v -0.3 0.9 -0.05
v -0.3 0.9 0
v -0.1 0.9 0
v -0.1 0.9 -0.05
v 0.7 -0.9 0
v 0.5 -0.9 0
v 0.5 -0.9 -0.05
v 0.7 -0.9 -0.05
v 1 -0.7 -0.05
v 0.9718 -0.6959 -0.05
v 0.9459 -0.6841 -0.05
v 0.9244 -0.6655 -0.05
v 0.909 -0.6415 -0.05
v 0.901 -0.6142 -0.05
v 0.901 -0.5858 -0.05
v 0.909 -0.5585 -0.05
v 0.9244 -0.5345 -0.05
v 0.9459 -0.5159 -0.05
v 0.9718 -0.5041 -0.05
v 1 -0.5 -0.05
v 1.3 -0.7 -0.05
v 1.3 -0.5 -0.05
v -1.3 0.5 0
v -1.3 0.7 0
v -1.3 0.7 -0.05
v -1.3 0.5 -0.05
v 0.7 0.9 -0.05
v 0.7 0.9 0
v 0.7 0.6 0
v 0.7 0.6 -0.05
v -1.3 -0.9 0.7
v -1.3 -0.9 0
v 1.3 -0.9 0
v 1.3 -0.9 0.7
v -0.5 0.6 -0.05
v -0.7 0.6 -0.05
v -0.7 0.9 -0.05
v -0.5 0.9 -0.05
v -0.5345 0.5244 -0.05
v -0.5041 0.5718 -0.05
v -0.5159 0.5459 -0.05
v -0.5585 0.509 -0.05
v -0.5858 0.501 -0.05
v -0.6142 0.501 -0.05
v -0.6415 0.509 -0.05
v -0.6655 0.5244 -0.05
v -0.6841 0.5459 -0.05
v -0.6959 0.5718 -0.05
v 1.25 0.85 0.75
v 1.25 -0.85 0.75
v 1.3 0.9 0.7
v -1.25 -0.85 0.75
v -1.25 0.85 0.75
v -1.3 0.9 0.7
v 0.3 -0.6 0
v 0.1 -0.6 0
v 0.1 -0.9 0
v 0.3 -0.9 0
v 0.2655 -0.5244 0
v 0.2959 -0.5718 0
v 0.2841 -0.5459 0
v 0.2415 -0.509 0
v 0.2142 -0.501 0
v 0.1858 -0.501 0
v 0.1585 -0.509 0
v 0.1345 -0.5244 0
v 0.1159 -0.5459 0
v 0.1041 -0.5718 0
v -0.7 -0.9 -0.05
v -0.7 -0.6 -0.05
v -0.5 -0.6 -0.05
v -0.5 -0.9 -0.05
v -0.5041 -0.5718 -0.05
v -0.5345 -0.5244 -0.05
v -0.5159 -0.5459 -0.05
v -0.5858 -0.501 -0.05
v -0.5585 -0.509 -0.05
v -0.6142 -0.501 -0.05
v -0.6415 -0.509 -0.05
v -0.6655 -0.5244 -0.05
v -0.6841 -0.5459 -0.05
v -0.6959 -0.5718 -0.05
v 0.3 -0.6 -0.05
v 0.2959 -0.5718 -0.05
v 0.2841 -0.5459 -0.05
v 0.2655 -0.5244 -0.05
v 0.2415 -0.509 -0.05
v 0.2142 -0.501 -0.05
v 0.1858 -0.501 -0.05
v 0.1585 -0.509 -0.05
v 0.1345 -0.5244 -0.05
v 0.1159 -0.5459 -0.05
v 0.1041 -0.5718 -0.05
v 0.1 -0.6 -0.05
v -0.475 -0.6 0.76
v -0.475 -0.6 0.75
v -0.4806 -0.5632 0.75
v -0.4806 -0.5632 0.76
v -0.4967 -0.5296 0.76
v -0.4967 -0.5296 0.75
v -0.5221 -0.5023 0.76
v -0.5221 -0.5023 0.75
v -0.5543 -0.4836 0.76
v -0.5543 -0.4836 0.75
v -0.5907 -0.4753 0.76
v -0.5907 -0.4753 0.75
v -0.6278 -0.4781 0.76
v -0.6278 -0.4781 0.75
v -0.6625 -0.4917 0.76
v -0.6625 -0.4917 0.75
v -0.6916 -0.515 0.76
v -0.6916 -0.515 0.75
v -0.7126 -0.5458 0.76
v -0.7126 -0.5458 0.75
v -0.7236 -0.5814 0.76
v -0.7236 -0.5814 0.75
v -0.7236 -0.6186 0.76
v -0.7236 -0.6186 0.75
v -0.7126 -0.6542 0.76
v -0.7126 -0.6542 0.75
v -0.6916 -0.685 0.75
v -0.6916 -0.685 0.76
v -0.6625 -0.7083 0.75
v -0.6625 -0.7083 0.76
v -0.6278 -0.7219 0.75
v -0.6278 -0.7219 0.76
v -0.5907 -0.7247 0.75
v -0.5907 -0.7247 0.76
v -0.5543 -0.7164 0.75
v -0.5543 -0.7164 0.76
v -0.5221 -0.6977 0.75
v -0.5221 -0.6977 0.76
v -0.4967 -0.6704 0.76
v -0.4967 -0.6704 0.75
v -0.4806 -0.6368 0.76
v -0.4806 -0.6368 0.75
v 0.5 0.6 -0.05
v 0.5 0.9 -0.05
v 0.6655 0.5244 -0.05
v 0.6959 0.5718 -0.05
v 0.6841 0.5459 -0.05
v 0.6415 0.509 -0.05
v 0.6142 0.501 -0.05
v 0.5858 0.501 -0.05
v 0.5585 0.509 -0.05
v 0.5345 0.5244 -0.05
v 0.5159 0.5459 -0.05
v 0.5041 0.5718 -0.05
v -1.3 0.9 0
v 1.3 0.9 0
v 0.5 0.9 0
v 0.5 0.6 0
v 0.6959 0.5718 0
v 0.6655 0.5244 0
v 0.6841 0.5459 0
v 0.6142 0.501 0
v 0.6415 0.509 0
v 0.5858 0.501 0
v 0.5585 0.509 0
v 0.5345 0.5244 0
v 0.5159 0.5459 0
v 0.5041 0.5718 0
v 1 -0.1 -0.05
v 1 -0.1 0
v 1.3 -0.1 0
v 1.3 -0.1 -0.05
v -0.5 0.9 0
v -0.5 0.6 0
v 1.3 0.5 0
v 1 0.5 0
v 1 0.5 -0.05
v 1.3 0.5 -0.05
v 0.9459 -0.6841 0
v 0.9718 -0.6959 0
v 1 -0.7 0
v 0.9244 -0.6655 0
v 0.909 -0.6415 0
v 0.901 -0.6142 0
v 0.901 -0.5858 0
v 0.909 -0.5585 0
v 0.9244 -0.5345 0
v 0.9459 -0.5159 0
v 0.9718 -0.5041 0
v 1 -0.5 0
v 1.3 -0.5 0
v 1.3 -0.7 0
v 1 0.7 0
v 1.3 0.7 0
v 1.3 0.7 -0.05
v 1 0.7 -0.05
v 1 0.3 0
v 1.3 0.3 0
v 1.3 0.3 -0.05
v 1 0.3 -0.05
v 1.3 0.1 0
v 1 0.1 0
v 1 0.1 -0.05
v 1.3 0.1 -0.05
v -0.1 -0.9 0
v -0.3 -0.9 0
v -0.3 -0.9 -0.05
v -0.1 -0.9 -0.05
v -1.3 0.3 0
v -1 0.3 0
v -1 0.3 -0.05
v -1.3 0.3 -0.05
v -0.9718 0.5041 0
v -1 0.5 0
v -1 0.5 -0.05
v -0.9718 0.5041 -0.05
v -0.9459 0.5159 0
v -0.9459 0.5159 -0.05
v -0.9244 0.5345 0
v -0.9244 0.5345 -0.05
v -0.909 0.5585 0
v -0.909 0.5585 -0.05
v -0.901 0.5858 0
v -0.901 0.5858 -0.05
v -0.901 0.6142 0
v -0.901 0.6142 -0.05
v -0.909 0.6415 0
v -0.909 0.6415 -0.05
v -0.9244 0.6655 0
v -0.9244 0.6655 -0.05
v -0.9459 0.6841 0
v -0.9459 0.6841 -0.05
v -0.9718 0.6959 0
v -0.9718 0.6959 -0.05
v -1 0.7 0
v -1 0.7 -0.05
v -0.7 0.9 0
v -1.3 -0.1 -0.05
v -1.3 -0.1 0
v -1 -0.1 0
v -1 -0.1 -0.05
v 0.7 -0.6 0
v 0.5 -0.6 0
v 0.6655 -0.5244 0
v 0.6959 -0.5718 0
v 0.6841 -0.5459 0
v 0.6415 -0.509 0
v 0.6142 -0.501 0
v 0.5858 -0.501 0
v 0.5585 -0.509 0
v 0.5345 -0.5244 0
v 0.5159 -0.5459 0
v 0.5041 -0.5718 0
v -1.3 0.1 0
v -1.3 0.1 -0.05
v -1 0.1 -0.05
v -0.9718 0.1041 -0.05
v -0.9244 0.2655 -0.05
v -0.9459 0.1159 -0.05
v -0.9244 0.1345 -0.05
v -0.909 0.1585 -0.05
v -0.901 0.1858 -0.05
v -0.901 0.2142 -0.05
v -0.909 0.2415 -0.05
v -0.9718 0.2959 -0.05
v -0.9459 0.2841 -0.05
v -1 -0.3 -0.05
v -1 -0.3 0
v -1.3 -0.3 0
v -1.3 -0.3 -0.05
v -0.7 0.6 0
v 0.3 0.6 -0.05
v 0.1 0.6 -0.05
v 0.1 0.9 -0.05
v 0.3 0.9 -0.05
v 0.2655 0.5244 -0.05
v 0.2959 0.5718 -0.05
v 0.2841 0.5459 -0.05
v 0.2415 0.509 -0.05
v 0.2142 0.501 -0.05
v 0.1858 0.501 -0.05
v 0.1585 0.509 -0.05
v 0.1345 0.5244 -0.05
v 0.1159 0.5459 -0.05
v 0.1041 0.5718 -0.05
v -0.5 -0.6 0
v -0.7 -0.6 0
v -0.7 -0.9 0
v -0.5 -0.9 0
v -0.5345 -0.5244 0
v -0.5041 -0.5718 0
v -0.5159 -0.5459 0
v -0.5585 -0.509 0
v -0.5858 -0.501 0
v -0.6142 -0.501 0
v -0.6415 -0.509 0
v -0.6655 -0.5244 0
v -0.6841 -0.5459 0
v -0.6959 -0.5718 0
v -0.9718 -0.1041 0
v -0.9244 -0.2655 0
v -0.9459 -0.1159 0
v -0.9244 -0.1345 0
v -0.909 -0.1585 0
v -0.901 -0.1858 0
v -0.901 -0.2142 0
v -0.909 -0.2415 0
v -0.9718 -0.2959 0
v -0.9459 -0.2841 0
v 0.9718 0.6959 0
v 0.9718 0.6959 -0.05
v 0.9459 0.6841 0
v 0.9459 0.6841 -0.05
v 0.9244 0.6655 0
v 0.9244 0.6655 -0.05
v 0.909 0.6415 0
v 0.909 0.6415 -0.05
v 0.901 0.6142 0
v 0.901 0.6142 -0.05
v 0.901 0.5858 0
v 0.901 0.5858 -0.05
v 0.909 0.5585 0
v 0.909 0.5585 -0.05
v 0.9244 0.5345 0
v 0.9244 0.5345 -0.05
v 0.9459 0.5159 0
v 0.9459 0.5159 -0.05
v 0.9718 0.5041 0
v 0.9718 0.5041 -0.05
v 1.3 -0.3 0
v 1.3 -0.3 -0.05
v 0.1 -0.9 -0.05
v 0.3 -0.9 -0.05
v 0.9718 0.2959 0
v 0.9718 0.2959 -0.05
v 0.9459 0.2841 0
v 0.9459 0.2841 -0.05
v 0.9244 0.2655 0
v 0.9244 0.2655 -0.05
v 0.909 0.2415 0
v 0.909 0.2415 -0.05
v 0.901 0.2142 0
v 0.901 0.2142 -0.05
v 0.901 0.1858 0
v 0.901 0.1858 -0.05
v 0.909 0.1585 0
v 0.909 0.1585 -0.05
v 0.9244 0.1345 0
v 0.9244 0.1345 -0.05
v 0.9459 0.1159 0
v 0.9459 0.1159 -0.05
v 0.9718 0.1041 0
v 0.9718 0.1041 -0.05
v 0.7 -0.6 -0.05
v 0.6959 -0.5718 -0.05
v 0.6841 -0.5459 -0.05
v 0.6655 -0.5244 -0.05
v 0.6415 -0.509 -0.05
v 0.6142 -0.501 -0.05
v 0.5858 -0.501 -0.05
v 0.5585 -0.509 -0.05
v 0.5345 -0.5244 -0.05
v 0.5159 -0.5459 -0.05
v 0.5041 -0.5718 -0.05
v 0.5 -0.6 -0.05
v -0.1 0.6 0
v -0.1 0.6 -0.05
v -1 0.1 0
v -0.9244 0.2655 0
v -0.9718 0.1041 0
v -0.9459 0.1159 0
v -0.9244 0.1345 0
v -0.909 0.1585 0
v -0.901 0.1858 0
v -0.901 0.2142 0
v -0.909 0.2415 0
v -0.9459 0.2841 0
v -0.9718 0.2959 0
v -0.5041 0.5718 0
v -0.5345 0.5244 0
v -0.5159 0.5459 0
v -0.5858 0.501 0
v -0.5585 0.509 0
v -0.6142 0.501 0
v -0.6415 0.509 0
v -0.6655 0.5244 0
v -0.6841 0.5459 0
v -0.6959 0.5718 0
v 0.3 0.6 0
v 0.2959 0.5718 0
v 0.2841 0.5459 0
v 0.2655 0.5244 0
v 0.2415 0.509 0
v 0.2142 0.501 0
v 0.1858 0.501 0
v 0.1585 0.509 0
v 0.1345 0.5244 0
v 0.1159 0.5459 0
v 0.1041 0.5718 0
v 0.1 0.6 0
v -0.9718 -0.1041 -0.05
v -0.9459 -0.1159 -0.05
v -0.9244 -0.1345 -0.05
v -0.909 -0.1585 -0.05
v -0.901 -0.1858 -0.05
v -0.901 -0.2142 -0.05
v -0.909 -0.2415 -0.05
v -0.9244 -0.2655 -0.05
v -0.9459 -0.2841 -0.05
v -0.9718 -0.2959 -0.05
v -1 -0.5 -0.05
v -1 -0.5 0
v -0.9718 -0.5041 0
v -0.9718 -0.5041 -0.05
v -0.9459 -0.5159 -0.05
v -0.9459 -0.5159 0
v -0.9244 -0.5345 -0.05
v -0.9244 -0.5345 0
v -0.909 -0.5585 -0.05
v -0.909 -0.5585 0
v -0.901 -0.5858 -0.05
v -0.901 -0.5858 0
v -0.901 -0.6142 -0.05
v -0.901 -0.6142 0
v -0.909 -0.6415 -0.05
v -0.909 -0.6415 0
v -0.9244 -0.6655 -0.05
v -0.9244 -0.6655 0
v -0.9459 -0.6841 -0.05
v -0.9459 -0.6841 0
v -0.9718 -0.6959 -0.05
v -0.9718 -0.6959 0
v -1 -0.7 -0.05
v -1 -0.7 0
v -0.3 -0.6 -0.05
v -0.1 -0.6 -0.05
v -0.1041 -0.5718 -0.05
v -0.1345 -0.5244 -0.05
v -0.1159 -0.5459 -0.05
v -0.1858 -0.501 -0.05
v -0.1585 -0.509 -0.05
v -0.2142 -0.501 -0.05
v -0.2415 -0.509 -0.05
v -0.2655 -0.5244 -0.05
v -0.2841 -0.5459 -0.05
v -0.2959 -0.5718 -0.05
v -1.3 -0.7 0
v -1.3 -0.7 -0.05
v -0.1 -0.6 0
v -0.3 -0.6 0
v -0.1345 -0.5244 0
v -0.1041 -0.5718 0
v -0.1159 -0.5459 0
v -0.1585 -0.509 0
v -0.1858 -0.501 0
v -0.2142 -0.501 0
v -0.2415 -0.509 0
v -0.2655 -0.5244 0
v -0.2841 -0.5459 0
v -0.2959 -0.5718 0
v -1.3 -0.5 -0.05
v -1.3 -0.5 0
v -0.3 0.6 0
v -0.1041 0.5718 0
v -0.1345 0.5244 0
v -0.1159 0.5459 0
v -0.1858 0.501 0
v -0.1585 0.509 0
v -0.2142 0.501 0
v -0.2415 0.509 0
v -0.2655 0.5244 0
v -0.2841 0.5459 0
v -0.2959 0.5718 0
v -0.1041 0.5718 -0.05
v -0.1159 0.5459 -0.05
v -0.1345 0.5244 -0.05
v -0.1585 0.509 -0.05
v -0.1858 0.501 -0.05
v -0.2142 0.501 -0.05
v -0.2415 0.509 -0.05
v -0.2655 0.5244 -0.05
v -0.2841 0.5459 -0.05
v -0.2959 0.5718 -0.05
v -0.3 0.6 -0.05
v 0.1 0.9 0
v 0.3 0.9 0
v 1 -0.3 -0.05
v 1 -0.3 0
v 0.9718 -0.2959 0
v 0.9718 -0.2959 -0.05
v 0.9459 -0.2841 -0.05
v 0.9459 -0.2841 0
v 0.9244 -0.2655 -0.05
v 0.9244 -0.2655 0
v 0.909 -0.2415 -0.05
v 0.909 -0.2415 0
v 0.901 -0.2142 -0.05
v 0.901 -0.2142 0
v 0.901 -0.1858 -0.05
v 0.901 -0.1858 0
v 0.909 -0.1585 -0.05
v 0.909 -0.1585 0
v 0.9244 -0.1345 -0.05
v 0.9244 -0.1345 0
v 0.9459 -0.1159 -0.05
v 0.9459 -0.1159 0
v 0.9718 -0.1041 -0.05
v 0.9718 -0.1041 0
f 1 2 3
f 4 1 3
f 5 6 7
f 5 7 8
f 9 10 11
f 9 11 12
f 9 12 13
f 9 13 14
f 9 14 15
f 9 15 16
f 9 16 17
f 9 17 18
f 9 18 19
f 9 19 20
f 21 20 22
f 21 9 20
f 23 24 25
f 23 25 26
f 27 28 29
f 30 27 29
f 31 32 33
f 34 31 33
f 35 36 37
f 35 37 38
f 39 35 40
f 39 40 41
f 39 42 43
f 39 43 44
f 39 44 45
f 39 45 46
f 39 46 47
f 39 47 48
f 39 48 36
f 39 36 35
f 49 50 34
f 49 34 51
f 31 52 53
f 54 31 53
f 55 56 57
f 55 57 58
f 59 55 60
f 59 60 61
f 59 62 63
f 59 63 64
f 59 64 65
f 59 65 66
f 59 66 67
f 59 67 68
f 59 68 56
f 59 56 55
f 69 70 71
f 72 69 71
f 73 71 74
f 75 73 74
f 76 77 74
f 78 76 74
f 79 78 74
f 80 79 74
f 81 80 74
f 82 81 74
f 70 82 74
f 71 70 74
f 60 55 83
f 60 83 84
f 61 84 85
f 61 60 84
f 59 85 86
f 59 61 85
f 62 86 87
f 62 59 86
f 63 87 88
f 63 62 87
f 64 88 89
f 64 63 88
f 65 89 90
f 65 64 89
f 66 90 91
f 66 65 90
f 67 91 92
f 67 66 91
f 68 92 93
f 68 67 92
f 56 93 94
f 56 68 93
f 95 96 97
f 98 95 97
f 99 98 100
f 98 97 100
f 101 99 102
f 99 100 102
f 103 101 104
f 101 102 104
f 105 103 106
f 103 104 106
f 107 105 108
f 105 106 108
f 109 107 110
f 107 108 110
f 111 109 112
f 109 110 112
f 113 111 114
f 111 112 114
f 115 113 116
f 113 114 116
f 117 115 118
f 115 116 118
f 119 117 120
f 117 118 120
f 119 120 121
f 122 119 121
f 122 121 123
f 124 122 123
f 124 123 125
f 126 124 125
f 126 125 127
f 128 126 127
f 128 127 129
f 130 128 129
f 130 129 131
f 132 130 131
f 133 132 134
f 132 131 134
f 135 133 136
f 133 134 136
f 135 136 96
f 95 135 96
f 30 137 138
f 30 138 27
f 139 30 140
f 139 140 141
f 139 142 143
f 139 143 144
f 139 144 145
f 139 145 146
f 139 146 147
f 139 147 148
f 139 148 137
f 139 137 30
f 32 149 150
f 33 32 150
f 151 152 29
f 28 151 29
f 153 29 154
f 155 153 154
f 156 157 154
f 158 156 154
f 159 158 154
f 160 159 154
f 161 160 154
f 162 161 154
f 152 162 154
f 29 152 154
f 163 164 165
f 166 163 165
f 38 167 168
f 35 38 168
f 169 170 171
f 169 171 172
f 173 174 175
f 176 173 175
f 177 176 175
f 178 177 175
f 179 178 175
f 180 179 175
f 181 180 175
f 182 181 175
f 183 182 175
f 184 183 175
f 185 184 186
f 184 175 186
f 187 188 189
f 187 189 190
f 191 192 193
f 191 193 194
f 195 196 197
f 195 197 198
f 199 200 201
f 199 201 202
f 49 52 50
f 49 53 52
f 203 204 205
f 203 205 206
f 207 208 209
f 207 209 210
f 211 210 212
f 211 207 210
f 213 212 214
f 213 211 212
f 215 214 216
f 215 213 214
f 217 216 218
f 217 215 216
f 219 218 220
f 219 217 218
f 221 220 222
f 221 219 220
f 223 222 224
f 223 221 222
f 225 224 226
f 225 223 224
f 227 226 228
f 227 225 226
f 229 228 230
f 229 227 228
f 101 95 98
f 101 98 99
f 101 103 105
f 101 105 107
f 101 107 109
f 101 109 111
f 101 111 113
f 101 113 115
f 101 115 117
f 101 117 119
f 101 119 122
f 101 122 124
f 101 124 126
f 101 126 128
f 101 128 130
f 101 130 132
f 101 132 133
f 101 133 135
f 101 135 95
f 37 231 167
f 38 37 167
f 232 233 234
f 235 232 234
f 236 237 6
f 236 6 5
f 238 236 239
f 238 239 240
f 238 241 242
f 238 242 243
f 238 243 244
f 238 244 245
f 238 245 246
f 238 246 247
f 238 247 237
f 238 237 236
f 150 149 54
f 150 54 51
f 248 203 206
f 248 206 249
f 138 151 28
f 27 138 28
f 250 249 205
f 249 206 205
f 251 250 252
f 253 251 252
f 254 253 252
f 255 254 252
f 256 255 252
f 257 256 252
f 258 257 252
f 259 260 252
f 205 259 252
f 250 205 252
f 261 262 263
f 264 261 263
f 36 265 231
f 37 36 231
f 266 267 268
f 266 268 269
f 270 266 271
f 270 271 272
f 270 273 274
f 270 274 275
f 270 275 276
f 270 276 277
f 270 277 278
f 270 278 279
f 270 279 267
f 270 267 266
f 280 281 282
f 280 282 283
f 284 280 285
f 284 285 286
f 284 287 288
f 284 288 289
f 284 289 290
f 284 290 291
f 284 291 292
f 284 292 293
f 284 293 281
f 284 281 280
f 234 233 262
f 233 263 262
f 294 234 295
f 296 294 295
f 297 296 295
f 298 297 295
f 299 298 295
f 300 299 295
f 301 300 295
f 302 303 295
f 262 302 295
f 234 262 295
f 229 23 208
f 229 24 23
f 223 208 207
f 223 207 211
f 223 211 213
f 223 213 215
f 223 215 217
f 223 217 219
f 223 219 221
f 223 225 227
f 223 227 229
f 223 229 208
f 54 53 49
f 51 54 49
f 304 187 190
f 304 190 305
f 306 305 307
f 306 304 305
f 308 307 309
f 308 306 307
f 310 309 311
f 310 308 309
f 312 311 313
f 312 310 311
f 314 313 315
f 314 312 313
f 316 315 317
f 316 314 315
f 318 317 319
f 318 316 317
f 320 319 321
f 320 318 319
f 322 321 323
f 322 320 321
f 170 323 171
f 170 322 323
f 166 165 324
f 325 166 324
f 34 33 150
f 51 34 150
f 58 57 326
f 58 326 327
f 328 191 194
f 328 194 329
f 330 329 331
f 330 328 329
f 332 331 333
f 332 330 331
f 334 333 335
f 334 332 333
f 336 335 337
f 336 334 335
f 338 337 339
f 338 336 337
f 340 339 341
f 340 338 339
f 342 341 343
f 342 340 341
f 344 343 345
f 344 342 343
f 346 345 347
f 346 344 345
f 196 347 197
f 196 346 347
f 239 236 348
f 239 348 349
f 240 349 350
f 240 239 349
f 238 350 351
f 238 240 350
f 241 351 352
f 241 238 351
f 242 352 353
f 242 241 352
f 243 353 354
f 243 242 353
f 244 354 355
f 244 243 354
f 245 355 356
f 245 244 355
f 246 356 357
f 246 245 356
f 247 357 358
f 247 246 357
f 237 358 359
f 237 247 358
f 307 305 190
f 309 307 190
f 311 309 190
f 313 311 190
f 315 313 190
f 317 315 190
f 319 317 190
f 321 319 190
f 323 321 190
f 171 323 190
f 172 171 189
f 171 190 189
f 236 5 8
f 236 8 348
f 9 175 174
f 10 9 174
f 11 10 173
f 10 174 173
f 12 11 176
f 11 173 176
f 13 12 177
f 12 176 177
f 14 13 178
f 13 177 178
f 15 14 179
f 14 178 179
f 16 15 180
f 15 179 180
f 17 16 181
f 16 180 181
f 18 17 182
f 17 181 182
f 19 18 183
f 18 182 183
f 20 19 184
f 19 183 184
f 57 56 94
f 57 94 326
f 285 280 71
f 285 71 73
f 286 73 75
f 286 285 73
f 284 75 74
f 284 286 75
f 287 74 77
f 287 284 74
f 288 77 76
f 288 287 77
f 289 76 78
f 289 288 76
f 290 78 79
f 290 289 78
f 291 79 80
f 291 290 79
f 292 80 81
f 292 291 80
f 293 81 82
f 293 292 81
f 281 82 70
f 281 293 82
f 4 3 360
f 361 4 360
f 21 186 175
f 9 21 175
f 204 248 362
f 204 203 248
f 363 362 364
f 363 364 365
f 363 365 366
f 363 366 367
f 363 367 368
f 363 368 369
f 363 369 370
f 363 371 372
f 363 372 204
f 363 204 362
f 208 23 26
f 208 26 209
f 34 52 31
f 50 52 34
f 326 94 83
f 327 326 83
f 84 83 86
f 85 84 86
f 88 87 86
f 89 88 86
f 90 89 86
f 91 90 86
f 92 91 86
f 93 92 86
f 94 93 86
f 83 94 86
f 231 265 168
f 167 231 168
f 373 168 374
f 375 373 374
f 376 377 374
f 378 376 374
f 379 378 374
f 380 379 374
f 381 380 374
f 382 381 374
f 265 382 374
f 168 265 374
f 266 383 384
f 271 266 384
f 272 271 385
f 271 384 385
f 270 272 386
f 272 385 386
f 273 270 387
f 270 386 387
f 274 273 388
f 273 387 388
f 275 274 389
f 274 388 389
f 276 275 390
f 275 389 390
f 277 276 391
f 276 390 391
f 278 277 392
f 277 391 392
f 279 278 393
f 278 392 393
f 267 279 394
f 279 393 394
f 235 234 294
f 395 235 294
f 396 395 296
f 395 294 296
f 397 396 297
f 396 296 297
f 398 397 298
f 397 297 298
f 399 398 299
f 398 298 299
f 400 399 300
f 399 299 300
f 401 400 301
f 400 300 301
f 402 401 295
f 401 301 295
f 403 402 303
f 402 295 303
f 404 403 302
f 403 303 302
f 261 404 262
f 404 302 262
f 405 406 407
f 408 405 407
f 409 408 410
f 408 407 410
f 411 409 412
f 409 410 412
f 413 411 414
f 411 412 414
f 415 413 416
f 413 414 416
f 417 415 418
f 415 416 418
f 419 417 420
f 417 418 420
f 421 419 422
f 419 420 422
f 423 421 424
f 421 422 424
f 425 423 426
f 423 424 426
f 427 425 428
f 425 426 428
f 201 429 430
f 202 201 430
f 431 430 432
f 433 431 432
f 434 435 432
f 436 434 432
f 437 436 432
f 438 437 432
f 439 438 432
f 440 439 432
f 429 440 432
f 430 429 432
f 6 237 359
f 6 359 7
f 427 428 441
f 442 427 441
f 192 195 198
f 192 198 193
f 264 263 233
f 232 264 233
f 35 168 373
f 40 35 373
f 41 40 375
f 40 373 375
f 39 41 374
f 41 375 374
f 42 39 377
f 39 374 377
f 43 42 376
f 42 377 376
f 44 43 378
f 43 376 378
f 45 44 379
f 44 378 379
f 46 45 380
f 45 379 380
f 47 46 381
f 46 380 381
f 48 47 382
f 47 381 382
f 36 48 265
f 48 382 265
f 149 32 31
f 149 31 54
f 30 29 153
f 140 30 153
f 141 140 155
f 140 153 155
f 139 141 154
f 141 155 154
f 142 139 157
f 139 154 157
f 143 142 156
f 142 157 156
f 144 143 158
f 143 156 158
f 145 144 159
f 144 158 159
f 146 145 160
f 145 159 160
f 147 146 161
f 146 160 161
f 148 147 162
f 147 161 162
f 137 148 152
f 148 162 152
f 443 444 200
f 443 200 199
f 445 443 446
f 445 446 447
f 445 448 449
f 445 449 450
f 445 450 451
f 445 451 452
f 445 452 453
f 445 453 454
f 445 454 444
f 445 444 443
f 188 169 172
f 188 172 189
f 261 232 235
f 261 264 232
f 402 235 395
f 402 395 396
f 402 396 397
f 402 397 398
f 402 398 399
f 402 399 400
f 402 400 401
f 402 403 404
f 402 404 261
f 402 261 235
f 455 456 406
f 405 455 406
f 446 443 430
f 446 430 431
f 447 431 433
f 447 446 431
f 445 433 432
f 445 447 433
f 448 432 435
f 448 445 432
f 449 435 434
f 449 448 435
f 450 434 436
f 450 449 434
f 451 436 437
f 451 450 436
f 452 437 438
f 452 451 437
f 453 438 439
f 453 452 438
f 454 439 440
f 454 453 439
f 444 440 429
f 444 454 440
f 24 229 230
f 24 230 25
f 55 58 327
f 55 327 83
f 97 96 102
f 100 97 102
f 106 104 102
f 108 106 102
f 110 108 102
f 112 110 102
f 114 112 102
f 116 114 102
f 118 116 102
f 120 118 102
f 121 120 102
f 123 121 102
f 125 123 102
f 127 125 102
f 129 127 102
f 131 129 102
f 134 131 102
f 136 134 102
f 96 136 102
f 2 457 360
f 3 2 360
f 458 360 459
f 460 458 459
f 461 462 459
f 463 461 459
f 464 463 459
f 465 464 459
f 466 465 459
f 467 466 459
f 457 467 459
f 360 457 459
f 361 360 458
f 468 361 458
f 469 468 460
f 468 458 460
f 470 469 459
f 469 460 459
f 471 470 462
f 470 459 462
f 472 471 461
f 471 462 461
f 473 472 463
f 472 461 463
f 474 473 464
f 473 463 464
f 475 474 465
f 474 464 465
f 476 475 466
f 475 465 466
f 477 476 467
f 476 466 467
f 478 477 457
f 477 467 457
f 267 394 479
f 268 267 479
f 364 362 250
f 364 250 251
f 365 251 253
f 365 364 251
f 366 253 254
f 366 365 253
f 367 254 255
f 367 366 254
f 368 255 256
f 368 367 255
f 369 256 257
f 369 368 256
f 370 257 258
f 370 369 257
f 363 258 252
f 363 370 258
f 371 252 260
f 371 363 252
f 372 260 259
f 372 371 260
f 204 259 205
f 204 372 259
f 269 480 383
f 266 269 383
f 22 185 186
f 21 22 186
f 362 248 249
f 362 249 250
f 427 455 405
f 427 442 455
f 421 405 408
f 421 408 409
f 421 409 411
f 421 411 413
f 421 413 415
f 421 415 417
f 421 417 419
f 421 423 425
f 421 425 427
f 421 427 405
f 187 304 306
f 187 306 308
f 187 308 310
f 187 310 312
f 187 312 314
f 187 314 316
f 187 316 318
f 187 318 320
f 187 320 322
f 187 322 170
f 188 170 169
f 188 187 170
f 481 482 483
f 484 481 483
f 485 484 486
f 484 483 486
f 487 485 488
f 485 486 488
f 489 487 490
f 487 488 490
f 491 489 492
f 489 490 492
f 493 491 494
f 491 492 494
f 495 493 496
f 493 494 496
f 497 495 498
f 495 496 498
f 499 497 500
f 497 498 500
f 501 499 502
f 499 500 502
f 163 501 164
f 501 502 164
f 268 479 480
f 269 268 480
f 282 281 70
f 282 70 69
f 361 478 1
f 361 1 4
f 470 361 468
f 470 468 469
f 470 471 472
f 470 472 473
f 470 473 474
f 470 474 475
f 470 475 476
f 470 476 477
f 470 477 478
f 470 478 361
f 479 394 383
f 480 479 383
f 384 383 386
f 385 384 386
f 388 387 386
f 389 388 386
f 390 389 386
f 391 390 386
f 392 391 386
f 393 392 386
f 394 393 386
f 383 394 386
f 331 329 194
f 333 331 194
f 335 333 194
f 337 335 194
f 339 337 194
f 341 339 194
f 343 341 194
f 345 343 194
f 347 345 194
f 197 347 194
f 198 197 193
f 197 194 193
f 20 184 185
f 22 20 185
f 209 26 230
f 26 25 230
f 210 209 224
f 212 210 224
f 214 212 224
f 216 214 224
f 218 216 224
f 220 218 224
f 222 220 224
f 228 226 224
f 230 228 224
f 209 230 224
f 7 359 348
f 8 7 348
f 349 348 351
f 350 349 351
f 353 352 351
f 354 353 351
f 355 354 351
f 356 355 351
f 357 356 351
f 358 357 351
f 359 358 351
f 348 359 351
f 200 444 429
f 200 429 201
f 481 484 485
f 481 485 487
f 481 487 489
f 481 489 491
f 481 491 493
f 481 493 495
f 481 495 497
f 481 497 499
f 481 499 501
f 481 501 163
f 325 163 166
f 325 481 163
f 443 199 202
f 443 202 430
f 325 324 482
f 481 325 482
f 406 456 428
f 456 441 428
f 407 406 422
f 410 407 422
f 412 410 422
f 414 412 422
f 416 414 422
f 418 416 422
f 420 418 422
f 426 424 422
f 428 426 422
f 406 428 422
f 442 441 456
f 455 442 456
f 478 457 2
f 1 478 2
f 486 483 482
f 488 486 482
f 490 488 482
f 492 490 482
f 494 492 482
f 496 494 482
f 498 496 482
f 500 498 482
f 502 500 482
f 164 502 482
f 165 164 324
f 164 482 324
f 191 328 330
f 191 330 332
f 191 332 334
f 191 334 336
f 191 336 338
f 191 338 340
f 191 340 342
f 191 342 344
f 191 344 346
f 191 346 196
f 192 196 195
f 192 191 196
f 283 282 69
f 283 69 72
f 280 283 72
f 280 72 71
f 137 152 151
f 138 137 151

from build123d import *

# Parameters (mm, degrees)
F0_W     = 2.6
F0_H     = 1.8
F1_DEPTH = 0.75
F3_DEPTH = 0.05
F5_R     = 0.125
F6_DEPTH = 0.01
F7_SIZE  = 0.05


with BuildPart() as f1:
    # F0 (on Top) → F1 (new body)
    with BuildSketch(Plane.XY):
        Rectangle(F0_W, F0_H)
    extrude(amount=F1_DEPTH)

    # F7
    f7_edges = [f1.edges().sort_by_distance(p)[0] for p in [
        (0, -0.9, 0.75),
        (1.3, 0, 0.75),
        (0, 0.9, 0.75),
        (-1.3, 0, 0.75),
    ]]
    chamfer(f7_edges, length=F7_SIZE)


with BuildPart() as f3:
    # F2 (on Top) → F3 (new body)
    with BuildSketch(Plane.XY):
        with BuildLine():
            Line((-0.5, -0.9), (-0.5, -0.6))
            ThreePointArc((-0.5, -0.6), (-0.6, -0.5), (-0.7, -0.6))
            Line((-0.7, -0.6), (-0.7, -0.9))
            Line((-0.7, -0.9), (-0.5, -0.9))
        make_face()
        with BuildLine():
            Line((-0.1, -0.9), (-0.1, -0.6))
            ThreePointArc((-0.1, -0.6), (-0.2, -0.5), (-0.3, -0.6))
            Line((-0.3, -0.6), (-0.3, -0.9))
            Line((-0.3, -0.9), (-0.1, -0.9))
        make_face()
        with BuildLine():
            Line((0.3, -0.9), (0.3, -0.6))
            ThreePointArc((0.3, -0.6), (0.2, -0.5), (0.1, -0.6))
            Line((0.1, -0.6), (0.1, -0.9))
            Line((0.1, -0.9), (0.3, -0.9))
        make_face()
        with BuildLine():
            Line((0.7, -0.9), (0.7, -0.6))
            ThreePointArc((0.7, -0.6), (0.6, -0.5), (0.5, -0.6))
            Line((0.5, -0.6), (0.5, -0.9))
            Line((0.5, -0.9), (0.7, -0.9))
        make_face()
        with BuildLine():
            Line((-1.3, 0.5), (-1, 0.5))
            ThreePointArc((-1, 0.5), (-0.9, 0.6), (-1, 0.7))
            Line((-1, 0.7), (-1.3, 0.7))
            Line((-1.3, 0.7), (-1.3, 0.5))
        make_face()
        with BuildLine():
            Line((-1.3, 0.1), (-1, 0.1))
            ThreePointArc((-1, 0.1), (-0.9, 0.2), (-1, 0.3))
            Line((-1, 0.3), (-1.3, 0.3))
            Line((-1.3, 0.3), (-1.3, 0.1))
        make_face()
        with BuildLine():
            Line((1, 0.1), (1.3, 0.1))
            Line((1.3, 0.1), (1.3, 0.3))
            Line((1.3, 0.3), (1, 0.3))
            ThreePointArc((1, 0.3), (0.9, 0.2), (1, 0.1))
        make_face()
        with BuildLine():
            Line((1.3, 0.7), (1, 0.7))
            ThreePointArc((1, 0.7), (0.9, 0.6), (1, 0.5))
            Line((1, 0.5), (1.3, 0.5))
            Line((1.3, 0.5), (1.3, 0.7))
        make_face()
    extrude(amount=-F3_DEPTH)


with BuildPart() as f4_1:
    # F4: instance of F3
    add(f3.part.mirror(Plane.XZ))


with BuildPart() as f6:
    # F5 (on face) → F6 (new body)
    with BuildSketch(Plane.XY.offset(0.75)):
        with Locations((-0.6, -0.6)):
            Circle(F5_R)
    extrude(amount=F6_DEPTH)


solid = Compound([f1.part, f3.part, f4_1.part, f6.part])
